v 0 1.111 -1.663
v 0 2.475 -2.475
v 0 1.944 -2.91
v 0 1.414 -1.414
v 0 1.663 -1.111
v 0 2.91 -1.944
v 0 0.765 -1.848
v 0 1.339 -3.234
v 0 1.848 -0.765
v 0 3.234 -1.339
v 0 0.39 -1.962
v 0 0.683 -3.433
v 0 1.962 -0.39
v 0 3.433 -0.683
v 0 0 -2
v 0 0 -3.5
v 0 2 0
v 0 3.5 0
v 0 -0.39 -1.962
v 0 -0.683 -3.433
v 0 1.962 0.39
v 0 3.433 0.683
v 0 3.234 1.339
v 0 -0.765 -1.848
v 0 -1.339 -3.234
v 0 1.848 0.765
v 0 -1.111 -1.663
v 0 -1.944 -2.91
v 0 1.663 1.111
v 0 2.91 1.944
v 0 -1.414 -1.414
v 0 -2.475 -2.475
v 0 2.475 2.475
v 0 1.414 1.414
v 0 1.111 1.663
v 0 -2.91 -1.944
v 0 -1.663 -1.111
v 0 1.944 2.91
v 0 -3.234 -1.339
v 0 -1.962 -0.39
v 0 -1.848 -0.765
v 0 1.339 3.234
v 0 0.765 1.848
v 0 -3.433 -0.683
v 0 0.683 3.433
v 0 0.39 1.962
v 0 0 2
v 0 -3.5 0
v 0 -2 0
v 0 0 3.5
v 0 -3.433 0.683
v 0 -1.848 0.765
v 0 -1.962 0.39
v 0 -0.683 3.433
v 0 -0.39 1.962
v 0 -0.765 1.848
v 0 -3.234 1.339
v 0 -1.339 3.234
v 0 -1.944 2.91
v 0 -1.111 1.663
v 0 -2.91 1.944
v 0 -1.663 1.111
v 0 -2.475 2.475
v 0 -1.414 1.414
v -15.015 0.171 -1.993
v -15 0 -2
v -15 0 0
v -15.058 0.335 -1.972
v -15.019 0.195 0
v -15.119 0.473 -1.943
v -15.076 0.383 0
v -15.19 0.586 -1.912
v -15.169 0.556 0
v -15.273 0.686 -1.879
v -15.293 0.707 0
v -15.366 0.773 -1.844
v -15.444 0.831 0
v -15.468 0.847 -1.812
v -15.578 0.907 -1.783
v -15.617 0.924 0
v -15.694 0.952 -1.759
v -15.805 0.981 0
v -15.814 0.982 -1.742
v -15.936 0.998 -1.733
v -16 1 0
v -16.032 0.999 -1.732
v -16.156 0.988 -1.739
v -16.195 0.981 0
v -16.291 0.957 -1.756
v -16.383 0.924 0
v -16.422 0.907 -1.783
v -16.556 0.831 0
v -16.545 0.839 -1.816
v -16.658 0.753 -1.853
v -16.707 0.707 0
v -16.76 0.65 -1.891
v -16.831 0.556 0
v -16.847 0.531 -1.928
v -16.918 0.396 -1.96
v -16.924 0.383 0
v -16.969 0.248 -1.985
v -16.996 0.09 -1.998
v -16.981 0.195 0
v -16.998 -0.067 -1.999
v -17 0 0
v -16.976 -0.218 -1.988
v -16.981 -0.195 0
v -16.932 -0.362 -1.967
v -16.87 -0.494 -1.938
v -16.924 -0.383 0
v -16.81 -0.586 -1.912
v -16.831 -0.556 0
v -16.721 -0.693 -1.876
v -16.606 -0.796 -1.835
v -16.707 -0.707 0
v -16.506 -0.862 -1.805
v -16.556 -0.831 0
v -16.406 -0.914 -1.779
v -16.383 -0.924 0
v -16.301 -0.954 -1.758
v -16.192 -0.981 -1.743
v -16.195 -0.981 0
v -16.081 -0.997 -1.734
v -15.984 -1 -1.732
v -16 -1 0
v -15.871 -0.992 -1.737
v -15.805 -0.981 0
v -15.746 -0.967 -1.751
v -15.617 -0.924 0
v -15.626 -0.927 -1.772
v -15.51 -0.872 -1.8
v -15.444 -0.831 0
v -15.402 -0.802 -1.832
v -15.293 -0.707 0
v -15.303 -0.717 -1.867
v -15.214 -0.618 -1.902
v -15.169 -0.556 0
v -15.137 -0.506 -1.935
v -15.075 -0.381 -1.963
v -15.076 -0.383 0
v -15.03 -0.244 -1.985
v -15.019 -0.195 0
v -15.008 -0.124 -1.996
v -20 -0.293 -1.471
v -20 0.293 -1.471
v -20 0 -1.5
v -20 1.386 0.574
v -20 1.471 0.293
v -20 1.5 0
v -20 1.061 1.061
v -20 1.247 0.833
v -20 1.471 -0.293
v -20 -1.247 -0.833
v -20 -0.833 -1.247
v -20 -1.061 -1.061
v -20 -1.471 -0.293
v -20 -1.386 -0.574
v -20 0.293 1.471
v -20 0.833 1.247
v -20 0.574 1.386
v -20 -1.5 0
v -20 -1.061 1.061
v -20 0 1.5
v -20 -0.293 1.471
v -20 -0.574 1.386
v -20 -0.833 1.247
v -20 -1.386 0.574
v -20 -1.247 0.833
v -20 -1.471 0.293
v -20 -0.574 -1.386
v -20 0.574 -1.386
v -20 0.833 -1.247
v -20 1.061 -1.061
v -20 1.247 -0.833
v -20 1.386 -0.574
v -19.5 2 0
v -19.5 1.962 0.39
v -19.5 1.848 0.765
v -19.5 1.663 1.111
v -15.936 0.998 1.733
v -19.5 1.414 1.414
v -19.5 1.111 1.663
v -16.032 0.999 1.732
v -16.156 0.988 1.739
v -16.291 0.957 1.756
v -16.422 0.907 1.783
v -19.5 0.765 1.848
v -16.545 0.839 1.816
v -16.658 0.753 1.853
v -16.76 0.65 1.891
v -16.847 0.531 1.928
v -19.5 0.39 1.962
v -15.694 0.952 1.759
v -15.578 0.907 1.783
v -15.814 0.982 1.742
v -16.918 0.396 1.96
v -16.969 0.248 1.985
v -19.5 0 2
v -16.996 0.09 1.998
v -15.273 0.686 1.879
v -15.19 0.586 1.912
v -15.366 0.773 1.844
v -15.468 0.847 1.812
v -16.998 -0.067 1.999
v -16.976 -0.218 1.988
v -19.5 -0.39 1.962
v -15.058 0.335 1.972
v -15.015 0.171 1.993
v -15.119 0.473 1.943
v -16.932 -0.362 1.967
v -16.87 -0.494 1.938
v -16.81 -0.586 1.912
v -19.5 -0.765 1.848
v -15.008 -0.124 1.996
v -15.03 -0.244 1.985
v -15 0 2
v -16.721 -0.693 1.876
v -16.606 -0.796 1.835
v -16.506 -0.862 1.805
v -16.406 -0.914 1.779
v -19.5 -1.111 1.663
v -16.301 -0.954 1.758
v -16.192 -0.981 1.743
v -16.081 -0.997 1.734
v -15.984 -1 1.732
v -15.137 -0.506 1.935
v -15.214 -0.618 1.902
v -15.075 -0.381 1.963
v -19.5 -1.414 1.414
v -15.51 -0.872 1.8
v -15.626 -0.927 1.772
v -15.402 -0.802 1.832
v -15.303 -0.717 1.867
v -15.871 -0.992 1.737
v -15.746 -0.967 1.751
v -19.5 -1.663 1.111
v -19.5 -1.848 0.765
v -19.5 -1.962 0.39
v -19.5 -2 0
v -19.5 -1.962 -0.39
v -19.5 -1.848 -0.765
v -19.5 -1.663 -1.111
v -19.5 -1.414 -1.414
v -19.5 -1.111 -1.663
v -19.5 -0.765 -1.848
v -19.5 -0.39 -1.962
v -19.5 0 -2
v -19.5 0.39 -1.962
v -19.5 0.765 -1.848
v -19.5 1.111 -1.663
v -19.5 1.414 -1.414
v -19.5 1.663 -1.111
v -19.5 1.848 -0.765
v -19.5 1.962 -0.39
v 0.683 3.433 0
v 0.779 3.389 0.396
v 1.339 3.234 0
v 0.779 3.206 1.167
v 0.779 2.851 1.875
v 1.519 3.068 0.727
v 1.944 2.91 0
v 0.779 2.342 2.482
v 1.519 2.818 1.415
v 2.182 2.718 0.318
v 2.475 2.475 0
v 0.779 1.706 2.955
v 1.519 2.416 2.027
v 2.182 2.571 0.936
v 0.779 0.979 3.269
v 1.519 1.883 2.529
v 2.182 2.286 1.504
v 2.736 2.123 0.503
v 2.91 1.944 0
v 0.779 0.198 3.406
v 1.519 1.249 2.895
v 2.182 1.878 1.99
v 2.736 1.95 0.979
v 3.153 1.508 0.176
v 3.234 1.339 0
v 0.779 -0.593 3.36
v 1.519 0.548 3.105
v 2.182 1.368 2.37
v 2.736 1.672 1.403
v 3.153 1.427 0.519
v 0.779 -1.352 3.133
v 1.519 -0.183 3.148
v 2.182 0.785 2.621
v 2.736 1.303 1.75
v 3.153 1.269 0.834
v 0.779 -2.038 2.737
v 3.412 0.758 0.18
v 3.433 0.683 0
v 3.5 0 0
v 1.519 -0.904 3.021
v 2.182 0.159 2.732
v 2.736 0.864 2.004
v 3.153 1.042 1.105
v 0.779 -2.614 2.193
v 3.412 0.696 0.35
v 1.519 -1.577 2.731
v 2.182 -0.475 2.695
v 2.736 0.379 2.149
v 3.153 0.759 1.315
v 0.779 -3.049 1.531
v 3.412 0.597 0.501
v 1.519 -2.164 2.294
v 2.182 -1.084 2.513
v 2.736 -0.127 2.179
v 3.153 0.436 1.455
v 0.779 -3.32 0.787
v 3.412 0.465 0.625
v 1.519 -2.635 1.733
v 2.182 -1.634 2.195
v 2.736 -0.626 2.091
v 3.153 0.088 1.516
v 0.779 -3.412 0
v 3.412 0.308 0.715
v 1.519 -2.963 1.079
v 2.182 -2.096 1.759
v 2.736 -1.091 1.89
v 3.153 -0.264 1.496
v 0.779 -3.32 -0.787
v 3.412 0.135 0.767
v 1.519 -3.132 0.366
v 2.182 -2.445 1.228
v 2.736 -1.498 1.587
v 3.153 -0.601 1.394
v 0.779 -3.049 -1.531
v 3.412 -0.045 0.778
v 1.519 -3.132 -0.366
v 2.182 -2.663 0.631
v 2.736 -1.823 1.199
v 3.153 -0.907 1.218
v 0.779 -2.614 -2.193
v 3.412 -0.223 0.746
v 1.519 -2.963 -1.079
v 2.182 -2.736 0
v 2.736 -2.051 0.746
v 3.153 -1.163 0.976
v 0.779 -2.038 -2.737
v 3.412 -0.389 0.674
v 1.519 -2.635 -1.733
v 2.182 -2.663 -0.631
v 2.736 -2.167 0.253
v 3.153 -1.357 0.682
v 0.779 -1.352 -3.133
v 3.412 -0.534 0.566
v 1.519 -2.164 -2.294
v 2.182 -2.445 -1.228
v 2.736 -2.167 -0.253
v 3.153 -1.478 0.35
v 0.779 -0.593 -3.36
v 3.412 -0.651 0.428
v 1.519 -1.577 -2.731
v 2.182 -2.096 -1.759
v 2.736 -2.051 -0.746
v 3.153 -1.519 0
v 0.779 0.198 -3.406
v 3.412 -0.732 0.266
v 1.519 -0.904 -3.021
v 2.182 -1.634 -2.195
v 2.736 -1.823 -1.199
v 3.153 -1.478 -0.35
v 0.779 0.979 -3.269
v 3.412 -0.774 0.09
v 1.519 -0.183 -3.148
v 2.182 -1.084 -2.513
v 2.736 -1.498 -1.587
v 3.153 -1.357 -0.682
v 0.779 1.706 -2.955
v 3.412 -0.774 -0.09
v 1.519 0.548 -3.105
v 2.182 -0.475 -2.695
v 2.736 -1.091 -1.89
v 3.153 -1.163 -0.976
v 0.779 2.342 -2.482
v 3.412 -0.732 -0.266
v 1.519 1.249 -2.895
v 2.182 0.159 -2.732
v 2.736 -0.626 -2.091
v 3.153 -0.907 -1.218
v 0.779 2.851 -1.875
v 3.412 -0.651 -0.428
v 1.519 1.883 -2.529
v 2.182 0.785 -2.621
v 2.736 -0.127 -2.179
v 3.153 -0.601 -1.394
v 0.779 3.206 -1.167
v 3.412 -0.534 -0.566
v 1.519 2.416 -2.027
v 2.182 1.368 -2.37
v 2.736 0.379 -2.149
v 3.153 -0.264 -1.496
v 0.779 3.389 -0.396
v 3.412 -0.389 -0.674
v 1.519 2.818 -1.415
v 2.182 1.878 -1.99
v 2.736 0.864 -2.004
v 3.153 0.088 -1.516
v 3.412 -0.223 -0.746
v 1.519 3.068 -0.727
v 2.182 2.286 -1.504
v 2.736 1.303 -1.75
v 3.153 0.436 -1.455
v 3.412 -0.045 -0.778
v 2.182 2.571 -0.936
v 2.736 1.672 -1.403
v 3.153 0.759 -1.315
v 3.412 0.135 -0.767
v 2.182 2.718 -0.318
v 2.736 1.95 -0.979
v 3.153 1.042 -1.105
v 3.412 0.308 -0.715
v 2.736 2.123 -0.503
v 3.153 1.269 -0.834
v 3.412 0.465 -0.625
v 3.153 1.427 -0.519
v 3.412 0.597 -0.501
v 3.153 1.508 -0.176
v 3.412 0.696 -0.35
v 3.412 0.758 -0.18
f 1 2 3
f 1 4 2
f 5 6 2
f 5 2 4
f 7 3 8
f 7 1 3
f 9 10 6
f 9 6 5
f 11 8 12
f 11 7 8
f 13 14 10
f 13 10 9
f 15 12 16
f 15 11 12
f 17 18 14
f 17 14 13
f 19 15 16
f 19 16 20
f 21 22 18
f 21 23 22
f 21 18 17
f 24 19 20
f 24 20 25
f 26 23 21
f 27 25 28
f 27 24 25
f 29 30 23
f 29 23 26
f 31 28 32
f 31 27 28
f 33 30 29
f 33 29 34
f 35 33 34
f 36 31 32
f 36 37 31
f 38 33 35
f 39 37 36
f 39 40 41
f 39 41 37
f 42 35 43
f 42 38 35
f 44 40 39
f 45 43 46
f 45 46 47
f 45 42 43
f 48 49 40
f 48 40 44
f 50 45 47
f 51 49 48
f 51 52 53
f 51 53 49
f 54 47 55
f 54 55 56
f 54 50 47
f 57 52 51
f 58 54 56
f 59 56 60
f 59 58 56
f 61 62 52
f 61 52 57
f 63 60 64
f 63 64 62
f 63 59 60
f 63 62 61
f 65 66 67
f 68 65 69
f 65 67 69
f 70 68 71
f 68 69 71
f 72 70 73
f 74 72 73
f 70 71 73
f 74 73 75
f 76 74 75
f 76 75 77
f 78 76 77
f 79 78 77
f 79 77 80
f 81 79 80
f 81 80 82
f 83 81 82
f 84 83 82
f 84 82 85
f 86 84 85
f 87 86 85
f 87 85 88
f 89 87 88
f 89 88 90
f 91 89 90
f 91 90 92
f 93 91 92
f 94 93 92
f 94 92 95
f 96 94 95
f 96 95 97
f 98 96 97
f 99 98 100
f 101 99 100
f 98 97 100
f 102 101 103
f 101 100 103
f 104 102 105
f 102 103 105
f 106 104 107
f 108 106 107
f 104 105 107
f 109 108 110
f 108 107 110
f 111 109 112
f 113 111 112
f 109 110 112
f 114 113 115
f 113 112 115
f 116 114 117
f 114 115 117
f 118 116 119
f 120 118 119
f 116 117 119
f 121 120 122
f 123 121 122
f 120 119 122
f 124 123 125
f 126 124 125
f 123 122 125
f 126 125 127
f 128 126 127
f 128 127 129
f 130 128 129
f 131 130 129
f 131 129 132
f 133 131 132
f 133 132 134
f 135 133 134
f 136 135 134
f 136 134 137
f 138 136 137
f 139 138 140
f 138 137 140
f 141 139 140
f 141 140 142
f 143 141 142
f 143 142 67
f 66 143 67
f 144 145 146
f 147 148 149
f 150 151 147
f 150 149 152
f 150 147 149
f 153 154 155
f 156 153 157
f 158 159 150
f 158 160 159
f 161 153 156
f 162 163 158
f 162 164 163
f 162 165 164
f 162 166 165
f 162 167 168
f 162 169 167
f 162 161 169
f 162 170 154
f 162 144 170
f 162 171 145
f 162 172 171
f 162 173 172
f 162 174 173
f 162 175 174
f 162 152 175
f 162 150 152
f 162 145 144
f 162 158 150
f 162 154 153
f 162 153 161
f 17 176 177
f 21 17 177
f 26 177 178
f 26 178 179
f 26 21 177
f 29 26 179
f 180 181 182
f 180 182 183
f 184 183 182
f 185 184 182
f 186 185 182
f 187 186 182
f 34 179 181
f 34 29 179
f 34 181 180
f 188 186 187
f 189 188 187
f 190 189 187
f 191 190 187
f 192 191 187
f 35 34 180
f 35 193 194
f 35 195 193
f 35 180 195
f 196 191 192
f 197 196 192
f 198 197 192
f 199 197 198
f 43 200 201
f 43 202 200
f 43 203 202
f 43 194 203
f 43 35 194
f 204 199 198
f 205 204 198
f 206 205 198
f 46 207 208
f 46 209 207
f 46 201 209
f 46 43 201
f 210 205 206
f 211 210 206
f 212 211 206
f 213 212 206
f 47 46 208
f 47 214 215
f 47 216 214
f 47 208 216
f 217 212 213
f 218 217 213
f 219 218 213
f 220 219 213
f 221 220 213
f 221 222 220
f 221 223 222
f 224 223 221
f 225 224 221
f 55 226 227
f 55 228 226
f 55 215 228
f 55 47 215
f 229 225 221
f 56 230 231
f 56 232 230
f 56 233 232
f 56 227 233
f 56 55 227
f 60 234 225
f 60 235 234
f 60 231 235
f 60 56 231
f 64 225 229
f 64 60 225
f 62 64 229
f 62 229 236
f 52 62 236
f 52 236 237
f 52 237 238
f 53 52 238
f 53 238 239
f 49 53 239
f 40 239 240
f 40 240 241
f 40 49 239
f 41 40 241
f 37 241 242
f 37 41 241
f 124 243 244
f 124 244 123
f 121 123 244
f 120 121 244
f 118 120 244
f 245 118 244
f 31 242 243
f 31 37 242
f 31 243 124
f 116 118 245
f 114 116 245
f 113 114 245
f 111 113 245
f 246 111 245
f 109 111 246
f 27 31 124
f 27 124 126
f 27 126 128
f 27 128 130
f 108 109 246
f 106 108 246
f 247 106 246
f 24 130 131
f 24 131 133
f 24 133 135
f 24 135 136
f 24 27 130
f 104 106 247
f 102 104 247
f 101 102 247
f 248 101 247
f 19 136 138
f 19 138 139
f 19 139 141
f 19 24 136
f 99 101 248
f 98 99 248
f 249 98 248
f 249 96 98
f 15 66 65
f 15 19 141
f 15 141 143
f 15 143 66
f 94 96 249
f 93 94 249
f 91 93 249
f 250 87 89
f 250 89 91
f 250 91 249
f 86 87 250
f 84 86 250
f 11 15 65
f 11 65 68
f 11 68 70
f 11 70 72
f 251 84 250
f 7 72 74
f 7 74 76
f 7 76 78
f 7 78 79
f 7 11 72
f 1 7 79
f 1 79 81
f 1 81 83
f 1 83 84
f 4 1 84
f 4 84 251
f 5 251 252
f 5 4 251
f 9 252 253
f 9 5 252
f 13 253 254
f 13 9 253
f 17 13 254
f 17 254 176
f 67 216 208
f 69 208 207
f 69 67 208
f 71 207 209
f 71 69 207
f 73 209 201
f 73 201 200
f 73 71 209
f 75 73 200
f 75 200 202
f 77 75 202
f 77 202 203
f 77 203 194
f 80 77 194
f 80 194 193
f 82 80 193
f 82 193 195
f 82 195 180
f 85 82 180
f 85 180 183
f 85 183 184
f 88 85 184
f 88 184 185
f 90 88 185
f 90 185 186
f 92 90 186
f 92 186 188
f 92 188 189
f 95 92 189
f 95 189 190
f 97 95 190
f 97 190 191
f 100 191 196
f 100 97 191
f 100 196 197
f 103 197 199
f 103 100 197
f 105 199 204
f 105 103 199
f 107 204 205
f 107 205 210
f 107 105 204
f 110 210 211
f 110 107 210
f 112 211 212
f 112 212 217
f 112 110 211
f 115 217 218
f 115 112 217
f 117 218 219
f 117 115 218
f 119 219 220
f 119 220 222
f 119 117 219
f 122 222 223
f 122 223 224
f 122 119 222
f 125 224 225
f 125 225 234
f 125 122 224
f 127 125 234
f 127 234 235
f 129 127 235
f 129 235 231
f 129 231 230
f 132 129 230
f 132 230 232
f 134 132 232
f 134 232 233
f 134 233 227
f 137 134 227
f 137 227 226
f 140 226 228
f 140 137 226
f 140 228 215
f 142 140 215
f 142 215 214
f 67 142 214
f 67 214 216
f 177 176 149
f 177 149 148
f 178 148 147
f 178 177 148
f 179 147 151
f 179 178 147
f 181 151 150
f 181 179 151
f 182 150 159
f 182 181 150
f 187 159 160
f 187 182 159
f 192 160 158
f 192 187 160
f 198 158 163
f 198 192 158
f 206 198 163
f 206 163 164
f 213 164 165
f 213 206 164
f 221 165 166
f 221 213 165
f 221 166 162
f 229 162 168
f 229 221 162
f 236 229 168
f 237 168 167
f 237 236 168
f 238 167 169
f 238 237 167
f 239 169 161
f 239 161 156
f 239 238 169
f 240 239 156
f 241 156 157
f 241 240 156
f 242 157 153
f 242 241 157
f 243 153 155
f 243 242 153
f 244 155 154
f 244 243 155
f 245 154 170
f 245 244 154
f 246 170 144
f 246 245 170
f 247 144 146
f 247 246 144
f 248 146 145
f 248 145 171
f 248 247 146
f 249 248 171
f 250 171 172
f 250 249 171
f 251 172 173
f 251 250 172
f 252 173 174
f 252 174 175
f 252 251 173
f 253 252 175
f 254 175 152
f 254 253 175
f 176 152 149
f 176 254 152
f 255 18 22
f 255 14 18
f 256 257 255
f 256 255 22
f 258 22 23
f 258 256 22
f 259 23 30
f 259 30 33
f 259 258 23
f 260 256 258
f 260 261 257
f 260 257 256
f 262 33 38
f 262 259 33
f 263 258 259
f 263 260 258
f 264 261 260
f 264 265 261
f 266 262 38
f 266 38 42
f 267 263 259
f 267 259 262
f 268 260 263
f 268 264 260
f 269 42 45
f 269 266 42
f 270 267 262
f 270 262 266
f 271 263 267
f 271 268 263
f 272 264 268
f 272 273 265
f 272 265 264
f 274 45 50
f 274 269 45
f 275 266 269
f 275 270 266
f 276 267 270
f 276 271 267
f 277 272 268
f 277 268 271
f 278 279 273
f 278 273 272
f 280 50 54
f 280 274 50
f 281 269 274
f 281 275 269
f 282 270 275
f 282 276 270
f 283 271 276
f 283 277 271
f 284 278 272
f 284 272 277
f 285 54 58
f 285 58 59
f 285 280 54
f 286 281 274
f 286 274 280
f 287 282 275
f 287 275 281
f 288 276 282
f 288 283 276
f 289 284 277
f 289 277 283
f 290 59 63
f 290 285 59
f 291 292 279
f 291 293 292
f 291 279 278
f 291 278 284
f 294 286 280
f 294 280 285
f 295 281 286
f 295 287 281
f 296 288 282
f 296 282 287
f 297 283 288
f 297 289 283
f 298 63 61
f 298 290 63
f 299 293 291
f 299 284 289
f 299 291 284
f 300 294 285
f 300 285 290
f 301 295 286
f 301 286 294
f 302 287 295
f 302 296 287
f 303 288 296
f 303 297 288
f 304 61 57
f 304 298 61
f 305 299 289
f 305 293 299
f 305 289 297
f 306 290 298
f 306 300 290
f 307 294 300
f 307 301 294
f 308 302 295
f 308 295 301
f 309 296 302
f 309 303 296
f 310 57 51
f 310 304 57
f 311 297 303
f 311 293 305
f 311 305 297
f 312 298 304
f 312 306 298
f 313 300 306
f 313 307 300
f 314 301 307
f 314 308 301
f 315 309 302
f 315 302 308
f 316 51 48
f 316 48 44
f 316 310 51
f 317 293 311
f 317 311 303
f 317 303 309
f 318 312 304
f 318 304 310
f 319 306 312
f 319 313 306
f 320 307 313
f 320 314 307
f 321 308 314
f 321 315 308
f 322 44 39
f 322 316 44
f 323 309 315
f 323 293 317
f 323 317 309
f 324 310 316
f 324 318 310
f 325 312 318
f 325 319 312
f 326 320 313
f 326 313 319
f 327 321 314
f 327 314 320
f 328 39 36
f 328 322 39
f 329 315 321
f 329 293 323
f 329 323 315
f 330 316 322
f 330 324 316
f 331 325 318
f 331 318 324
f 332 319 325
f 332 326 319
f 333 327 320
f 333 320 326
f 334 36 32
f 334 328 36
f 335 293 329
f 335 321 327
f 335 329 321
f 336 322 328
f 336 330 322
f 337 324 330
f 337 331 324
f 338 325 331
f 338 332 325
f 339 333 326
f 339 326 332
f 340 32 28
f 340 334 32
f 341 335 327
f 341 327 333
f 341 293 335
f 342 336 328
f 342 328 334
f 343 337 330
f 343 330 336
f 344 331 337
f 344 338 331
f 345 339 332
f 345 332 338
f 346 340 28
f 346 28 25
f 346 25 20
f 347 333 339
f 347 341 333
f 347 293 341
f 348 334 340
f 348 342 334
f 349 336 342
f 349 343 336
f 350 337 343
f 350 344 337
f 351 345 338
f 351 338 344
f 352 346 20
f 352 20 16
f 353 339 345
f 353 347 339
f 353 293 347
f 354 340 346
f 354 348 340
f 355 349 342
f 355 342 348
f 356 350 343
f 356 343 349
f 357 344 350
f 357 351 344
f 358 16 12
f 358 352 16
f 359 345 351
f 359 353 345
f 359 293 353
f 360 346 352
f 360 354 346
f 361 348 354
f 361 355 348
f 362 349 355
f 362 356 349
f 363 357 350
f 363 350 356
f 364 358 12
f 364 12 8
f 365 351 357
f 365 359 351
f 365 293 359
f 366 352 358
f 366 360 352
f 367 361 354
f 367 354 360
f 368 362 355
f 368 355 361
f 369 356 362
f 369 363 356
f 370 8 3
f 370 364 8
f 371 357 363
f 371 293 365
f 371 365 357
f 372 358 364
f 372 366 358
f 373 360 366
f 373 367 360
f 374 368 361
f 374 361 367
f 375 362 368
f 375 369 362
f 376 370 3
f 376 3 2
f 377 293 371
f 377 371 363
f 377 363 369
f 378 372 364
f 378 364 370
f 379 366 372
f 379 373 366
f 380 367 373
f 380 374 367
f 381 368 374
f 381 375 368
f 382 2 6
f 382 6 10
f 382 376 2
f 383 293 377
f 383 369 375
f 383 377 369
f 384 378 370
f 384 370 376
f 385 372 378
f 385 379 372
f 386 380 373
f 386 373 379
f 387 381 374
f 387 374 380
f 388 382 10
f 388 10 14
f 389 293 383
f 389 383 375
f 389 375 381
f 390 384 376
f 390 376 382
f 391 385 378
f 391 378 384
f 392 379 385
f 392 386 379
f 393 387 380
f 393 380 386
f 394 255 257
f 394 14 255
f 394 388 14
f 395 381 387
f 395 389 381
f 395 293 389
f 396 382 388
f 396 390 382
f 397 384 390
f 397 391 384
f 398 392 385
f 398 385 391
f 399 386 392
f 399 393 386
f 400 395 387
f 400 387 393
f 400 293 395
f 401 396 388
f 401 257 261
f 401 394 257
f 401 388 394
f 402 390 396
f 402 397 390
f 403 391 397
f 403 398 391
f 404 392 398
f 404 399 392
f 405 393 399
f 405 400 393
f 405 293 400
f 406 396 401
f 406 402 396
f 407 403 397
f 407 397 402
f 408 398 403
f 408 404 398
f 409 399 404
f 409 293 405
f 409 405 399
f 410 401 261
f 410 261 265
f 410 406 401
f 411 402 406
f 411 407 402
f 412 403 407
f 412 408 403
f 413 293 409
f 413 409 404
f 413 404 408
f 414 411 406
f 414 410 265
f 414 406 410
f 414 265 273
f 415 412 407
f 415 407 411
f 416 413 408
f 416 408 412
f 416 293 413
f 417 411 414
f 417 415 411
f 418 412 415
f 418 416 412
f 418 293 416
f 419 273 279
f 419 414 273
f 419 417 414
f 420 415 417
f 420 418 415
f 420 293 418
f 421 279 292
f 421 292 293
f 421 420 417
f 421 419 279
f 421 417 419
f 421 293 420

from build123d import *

# Parameters (mm, degrees)
SKETCH4_R               = 1
CUT_EXTRUDE1_DEPTH      = 4.5
CUT_EXTRUDE1_DEPTH_BACK = 4.5
CHAMFER1_SIZE           = 0.5


with BuildPart() as part:
    # Sketch3 → Revolve1 (revolve)
    with BuildSketch(Plane.XY):
        with BuildLine():
            Line((-20, 0), (-20, 2))
            Line((-20, 2), (0, 2))
            Line((0, 2), (0, 3.5))
            ThreePointArc((0, 3.5), (2.474873734, 2.474873734), (3.5, 0))
            Line((3.5, 0), (-20, 0))
        make_face()
    revolve(axis=Axis((-20, 0, 0), (1, 0, 0)))

    # Sketch4 → Cut-Extrude1 (cut, two sides)
    with BuildSketch(Plane.XY) as cut_extrude1_sk:
        with Locations((-16, 0)):
            Circle(SKETCH4_R)
    extrude(amount=CUT_EXTRUDE1_DEPTH, mode=Mode.SUBTRACT)
    extrude(cut_extrude1_sk.sketch, amount=-CUT_EXTRUDE1_DEPTH_BACK, mode=Mode.SUBTRACT)

    # Chamfer1
    chamfer1_edges = [part.edges().sort_by_distance(p)[0] for p in [
        (-20, -2, 0),
    ]]
    chamfer(chamfer1_edges, length=CHAMFER1_SIZE)


solid = part.part
